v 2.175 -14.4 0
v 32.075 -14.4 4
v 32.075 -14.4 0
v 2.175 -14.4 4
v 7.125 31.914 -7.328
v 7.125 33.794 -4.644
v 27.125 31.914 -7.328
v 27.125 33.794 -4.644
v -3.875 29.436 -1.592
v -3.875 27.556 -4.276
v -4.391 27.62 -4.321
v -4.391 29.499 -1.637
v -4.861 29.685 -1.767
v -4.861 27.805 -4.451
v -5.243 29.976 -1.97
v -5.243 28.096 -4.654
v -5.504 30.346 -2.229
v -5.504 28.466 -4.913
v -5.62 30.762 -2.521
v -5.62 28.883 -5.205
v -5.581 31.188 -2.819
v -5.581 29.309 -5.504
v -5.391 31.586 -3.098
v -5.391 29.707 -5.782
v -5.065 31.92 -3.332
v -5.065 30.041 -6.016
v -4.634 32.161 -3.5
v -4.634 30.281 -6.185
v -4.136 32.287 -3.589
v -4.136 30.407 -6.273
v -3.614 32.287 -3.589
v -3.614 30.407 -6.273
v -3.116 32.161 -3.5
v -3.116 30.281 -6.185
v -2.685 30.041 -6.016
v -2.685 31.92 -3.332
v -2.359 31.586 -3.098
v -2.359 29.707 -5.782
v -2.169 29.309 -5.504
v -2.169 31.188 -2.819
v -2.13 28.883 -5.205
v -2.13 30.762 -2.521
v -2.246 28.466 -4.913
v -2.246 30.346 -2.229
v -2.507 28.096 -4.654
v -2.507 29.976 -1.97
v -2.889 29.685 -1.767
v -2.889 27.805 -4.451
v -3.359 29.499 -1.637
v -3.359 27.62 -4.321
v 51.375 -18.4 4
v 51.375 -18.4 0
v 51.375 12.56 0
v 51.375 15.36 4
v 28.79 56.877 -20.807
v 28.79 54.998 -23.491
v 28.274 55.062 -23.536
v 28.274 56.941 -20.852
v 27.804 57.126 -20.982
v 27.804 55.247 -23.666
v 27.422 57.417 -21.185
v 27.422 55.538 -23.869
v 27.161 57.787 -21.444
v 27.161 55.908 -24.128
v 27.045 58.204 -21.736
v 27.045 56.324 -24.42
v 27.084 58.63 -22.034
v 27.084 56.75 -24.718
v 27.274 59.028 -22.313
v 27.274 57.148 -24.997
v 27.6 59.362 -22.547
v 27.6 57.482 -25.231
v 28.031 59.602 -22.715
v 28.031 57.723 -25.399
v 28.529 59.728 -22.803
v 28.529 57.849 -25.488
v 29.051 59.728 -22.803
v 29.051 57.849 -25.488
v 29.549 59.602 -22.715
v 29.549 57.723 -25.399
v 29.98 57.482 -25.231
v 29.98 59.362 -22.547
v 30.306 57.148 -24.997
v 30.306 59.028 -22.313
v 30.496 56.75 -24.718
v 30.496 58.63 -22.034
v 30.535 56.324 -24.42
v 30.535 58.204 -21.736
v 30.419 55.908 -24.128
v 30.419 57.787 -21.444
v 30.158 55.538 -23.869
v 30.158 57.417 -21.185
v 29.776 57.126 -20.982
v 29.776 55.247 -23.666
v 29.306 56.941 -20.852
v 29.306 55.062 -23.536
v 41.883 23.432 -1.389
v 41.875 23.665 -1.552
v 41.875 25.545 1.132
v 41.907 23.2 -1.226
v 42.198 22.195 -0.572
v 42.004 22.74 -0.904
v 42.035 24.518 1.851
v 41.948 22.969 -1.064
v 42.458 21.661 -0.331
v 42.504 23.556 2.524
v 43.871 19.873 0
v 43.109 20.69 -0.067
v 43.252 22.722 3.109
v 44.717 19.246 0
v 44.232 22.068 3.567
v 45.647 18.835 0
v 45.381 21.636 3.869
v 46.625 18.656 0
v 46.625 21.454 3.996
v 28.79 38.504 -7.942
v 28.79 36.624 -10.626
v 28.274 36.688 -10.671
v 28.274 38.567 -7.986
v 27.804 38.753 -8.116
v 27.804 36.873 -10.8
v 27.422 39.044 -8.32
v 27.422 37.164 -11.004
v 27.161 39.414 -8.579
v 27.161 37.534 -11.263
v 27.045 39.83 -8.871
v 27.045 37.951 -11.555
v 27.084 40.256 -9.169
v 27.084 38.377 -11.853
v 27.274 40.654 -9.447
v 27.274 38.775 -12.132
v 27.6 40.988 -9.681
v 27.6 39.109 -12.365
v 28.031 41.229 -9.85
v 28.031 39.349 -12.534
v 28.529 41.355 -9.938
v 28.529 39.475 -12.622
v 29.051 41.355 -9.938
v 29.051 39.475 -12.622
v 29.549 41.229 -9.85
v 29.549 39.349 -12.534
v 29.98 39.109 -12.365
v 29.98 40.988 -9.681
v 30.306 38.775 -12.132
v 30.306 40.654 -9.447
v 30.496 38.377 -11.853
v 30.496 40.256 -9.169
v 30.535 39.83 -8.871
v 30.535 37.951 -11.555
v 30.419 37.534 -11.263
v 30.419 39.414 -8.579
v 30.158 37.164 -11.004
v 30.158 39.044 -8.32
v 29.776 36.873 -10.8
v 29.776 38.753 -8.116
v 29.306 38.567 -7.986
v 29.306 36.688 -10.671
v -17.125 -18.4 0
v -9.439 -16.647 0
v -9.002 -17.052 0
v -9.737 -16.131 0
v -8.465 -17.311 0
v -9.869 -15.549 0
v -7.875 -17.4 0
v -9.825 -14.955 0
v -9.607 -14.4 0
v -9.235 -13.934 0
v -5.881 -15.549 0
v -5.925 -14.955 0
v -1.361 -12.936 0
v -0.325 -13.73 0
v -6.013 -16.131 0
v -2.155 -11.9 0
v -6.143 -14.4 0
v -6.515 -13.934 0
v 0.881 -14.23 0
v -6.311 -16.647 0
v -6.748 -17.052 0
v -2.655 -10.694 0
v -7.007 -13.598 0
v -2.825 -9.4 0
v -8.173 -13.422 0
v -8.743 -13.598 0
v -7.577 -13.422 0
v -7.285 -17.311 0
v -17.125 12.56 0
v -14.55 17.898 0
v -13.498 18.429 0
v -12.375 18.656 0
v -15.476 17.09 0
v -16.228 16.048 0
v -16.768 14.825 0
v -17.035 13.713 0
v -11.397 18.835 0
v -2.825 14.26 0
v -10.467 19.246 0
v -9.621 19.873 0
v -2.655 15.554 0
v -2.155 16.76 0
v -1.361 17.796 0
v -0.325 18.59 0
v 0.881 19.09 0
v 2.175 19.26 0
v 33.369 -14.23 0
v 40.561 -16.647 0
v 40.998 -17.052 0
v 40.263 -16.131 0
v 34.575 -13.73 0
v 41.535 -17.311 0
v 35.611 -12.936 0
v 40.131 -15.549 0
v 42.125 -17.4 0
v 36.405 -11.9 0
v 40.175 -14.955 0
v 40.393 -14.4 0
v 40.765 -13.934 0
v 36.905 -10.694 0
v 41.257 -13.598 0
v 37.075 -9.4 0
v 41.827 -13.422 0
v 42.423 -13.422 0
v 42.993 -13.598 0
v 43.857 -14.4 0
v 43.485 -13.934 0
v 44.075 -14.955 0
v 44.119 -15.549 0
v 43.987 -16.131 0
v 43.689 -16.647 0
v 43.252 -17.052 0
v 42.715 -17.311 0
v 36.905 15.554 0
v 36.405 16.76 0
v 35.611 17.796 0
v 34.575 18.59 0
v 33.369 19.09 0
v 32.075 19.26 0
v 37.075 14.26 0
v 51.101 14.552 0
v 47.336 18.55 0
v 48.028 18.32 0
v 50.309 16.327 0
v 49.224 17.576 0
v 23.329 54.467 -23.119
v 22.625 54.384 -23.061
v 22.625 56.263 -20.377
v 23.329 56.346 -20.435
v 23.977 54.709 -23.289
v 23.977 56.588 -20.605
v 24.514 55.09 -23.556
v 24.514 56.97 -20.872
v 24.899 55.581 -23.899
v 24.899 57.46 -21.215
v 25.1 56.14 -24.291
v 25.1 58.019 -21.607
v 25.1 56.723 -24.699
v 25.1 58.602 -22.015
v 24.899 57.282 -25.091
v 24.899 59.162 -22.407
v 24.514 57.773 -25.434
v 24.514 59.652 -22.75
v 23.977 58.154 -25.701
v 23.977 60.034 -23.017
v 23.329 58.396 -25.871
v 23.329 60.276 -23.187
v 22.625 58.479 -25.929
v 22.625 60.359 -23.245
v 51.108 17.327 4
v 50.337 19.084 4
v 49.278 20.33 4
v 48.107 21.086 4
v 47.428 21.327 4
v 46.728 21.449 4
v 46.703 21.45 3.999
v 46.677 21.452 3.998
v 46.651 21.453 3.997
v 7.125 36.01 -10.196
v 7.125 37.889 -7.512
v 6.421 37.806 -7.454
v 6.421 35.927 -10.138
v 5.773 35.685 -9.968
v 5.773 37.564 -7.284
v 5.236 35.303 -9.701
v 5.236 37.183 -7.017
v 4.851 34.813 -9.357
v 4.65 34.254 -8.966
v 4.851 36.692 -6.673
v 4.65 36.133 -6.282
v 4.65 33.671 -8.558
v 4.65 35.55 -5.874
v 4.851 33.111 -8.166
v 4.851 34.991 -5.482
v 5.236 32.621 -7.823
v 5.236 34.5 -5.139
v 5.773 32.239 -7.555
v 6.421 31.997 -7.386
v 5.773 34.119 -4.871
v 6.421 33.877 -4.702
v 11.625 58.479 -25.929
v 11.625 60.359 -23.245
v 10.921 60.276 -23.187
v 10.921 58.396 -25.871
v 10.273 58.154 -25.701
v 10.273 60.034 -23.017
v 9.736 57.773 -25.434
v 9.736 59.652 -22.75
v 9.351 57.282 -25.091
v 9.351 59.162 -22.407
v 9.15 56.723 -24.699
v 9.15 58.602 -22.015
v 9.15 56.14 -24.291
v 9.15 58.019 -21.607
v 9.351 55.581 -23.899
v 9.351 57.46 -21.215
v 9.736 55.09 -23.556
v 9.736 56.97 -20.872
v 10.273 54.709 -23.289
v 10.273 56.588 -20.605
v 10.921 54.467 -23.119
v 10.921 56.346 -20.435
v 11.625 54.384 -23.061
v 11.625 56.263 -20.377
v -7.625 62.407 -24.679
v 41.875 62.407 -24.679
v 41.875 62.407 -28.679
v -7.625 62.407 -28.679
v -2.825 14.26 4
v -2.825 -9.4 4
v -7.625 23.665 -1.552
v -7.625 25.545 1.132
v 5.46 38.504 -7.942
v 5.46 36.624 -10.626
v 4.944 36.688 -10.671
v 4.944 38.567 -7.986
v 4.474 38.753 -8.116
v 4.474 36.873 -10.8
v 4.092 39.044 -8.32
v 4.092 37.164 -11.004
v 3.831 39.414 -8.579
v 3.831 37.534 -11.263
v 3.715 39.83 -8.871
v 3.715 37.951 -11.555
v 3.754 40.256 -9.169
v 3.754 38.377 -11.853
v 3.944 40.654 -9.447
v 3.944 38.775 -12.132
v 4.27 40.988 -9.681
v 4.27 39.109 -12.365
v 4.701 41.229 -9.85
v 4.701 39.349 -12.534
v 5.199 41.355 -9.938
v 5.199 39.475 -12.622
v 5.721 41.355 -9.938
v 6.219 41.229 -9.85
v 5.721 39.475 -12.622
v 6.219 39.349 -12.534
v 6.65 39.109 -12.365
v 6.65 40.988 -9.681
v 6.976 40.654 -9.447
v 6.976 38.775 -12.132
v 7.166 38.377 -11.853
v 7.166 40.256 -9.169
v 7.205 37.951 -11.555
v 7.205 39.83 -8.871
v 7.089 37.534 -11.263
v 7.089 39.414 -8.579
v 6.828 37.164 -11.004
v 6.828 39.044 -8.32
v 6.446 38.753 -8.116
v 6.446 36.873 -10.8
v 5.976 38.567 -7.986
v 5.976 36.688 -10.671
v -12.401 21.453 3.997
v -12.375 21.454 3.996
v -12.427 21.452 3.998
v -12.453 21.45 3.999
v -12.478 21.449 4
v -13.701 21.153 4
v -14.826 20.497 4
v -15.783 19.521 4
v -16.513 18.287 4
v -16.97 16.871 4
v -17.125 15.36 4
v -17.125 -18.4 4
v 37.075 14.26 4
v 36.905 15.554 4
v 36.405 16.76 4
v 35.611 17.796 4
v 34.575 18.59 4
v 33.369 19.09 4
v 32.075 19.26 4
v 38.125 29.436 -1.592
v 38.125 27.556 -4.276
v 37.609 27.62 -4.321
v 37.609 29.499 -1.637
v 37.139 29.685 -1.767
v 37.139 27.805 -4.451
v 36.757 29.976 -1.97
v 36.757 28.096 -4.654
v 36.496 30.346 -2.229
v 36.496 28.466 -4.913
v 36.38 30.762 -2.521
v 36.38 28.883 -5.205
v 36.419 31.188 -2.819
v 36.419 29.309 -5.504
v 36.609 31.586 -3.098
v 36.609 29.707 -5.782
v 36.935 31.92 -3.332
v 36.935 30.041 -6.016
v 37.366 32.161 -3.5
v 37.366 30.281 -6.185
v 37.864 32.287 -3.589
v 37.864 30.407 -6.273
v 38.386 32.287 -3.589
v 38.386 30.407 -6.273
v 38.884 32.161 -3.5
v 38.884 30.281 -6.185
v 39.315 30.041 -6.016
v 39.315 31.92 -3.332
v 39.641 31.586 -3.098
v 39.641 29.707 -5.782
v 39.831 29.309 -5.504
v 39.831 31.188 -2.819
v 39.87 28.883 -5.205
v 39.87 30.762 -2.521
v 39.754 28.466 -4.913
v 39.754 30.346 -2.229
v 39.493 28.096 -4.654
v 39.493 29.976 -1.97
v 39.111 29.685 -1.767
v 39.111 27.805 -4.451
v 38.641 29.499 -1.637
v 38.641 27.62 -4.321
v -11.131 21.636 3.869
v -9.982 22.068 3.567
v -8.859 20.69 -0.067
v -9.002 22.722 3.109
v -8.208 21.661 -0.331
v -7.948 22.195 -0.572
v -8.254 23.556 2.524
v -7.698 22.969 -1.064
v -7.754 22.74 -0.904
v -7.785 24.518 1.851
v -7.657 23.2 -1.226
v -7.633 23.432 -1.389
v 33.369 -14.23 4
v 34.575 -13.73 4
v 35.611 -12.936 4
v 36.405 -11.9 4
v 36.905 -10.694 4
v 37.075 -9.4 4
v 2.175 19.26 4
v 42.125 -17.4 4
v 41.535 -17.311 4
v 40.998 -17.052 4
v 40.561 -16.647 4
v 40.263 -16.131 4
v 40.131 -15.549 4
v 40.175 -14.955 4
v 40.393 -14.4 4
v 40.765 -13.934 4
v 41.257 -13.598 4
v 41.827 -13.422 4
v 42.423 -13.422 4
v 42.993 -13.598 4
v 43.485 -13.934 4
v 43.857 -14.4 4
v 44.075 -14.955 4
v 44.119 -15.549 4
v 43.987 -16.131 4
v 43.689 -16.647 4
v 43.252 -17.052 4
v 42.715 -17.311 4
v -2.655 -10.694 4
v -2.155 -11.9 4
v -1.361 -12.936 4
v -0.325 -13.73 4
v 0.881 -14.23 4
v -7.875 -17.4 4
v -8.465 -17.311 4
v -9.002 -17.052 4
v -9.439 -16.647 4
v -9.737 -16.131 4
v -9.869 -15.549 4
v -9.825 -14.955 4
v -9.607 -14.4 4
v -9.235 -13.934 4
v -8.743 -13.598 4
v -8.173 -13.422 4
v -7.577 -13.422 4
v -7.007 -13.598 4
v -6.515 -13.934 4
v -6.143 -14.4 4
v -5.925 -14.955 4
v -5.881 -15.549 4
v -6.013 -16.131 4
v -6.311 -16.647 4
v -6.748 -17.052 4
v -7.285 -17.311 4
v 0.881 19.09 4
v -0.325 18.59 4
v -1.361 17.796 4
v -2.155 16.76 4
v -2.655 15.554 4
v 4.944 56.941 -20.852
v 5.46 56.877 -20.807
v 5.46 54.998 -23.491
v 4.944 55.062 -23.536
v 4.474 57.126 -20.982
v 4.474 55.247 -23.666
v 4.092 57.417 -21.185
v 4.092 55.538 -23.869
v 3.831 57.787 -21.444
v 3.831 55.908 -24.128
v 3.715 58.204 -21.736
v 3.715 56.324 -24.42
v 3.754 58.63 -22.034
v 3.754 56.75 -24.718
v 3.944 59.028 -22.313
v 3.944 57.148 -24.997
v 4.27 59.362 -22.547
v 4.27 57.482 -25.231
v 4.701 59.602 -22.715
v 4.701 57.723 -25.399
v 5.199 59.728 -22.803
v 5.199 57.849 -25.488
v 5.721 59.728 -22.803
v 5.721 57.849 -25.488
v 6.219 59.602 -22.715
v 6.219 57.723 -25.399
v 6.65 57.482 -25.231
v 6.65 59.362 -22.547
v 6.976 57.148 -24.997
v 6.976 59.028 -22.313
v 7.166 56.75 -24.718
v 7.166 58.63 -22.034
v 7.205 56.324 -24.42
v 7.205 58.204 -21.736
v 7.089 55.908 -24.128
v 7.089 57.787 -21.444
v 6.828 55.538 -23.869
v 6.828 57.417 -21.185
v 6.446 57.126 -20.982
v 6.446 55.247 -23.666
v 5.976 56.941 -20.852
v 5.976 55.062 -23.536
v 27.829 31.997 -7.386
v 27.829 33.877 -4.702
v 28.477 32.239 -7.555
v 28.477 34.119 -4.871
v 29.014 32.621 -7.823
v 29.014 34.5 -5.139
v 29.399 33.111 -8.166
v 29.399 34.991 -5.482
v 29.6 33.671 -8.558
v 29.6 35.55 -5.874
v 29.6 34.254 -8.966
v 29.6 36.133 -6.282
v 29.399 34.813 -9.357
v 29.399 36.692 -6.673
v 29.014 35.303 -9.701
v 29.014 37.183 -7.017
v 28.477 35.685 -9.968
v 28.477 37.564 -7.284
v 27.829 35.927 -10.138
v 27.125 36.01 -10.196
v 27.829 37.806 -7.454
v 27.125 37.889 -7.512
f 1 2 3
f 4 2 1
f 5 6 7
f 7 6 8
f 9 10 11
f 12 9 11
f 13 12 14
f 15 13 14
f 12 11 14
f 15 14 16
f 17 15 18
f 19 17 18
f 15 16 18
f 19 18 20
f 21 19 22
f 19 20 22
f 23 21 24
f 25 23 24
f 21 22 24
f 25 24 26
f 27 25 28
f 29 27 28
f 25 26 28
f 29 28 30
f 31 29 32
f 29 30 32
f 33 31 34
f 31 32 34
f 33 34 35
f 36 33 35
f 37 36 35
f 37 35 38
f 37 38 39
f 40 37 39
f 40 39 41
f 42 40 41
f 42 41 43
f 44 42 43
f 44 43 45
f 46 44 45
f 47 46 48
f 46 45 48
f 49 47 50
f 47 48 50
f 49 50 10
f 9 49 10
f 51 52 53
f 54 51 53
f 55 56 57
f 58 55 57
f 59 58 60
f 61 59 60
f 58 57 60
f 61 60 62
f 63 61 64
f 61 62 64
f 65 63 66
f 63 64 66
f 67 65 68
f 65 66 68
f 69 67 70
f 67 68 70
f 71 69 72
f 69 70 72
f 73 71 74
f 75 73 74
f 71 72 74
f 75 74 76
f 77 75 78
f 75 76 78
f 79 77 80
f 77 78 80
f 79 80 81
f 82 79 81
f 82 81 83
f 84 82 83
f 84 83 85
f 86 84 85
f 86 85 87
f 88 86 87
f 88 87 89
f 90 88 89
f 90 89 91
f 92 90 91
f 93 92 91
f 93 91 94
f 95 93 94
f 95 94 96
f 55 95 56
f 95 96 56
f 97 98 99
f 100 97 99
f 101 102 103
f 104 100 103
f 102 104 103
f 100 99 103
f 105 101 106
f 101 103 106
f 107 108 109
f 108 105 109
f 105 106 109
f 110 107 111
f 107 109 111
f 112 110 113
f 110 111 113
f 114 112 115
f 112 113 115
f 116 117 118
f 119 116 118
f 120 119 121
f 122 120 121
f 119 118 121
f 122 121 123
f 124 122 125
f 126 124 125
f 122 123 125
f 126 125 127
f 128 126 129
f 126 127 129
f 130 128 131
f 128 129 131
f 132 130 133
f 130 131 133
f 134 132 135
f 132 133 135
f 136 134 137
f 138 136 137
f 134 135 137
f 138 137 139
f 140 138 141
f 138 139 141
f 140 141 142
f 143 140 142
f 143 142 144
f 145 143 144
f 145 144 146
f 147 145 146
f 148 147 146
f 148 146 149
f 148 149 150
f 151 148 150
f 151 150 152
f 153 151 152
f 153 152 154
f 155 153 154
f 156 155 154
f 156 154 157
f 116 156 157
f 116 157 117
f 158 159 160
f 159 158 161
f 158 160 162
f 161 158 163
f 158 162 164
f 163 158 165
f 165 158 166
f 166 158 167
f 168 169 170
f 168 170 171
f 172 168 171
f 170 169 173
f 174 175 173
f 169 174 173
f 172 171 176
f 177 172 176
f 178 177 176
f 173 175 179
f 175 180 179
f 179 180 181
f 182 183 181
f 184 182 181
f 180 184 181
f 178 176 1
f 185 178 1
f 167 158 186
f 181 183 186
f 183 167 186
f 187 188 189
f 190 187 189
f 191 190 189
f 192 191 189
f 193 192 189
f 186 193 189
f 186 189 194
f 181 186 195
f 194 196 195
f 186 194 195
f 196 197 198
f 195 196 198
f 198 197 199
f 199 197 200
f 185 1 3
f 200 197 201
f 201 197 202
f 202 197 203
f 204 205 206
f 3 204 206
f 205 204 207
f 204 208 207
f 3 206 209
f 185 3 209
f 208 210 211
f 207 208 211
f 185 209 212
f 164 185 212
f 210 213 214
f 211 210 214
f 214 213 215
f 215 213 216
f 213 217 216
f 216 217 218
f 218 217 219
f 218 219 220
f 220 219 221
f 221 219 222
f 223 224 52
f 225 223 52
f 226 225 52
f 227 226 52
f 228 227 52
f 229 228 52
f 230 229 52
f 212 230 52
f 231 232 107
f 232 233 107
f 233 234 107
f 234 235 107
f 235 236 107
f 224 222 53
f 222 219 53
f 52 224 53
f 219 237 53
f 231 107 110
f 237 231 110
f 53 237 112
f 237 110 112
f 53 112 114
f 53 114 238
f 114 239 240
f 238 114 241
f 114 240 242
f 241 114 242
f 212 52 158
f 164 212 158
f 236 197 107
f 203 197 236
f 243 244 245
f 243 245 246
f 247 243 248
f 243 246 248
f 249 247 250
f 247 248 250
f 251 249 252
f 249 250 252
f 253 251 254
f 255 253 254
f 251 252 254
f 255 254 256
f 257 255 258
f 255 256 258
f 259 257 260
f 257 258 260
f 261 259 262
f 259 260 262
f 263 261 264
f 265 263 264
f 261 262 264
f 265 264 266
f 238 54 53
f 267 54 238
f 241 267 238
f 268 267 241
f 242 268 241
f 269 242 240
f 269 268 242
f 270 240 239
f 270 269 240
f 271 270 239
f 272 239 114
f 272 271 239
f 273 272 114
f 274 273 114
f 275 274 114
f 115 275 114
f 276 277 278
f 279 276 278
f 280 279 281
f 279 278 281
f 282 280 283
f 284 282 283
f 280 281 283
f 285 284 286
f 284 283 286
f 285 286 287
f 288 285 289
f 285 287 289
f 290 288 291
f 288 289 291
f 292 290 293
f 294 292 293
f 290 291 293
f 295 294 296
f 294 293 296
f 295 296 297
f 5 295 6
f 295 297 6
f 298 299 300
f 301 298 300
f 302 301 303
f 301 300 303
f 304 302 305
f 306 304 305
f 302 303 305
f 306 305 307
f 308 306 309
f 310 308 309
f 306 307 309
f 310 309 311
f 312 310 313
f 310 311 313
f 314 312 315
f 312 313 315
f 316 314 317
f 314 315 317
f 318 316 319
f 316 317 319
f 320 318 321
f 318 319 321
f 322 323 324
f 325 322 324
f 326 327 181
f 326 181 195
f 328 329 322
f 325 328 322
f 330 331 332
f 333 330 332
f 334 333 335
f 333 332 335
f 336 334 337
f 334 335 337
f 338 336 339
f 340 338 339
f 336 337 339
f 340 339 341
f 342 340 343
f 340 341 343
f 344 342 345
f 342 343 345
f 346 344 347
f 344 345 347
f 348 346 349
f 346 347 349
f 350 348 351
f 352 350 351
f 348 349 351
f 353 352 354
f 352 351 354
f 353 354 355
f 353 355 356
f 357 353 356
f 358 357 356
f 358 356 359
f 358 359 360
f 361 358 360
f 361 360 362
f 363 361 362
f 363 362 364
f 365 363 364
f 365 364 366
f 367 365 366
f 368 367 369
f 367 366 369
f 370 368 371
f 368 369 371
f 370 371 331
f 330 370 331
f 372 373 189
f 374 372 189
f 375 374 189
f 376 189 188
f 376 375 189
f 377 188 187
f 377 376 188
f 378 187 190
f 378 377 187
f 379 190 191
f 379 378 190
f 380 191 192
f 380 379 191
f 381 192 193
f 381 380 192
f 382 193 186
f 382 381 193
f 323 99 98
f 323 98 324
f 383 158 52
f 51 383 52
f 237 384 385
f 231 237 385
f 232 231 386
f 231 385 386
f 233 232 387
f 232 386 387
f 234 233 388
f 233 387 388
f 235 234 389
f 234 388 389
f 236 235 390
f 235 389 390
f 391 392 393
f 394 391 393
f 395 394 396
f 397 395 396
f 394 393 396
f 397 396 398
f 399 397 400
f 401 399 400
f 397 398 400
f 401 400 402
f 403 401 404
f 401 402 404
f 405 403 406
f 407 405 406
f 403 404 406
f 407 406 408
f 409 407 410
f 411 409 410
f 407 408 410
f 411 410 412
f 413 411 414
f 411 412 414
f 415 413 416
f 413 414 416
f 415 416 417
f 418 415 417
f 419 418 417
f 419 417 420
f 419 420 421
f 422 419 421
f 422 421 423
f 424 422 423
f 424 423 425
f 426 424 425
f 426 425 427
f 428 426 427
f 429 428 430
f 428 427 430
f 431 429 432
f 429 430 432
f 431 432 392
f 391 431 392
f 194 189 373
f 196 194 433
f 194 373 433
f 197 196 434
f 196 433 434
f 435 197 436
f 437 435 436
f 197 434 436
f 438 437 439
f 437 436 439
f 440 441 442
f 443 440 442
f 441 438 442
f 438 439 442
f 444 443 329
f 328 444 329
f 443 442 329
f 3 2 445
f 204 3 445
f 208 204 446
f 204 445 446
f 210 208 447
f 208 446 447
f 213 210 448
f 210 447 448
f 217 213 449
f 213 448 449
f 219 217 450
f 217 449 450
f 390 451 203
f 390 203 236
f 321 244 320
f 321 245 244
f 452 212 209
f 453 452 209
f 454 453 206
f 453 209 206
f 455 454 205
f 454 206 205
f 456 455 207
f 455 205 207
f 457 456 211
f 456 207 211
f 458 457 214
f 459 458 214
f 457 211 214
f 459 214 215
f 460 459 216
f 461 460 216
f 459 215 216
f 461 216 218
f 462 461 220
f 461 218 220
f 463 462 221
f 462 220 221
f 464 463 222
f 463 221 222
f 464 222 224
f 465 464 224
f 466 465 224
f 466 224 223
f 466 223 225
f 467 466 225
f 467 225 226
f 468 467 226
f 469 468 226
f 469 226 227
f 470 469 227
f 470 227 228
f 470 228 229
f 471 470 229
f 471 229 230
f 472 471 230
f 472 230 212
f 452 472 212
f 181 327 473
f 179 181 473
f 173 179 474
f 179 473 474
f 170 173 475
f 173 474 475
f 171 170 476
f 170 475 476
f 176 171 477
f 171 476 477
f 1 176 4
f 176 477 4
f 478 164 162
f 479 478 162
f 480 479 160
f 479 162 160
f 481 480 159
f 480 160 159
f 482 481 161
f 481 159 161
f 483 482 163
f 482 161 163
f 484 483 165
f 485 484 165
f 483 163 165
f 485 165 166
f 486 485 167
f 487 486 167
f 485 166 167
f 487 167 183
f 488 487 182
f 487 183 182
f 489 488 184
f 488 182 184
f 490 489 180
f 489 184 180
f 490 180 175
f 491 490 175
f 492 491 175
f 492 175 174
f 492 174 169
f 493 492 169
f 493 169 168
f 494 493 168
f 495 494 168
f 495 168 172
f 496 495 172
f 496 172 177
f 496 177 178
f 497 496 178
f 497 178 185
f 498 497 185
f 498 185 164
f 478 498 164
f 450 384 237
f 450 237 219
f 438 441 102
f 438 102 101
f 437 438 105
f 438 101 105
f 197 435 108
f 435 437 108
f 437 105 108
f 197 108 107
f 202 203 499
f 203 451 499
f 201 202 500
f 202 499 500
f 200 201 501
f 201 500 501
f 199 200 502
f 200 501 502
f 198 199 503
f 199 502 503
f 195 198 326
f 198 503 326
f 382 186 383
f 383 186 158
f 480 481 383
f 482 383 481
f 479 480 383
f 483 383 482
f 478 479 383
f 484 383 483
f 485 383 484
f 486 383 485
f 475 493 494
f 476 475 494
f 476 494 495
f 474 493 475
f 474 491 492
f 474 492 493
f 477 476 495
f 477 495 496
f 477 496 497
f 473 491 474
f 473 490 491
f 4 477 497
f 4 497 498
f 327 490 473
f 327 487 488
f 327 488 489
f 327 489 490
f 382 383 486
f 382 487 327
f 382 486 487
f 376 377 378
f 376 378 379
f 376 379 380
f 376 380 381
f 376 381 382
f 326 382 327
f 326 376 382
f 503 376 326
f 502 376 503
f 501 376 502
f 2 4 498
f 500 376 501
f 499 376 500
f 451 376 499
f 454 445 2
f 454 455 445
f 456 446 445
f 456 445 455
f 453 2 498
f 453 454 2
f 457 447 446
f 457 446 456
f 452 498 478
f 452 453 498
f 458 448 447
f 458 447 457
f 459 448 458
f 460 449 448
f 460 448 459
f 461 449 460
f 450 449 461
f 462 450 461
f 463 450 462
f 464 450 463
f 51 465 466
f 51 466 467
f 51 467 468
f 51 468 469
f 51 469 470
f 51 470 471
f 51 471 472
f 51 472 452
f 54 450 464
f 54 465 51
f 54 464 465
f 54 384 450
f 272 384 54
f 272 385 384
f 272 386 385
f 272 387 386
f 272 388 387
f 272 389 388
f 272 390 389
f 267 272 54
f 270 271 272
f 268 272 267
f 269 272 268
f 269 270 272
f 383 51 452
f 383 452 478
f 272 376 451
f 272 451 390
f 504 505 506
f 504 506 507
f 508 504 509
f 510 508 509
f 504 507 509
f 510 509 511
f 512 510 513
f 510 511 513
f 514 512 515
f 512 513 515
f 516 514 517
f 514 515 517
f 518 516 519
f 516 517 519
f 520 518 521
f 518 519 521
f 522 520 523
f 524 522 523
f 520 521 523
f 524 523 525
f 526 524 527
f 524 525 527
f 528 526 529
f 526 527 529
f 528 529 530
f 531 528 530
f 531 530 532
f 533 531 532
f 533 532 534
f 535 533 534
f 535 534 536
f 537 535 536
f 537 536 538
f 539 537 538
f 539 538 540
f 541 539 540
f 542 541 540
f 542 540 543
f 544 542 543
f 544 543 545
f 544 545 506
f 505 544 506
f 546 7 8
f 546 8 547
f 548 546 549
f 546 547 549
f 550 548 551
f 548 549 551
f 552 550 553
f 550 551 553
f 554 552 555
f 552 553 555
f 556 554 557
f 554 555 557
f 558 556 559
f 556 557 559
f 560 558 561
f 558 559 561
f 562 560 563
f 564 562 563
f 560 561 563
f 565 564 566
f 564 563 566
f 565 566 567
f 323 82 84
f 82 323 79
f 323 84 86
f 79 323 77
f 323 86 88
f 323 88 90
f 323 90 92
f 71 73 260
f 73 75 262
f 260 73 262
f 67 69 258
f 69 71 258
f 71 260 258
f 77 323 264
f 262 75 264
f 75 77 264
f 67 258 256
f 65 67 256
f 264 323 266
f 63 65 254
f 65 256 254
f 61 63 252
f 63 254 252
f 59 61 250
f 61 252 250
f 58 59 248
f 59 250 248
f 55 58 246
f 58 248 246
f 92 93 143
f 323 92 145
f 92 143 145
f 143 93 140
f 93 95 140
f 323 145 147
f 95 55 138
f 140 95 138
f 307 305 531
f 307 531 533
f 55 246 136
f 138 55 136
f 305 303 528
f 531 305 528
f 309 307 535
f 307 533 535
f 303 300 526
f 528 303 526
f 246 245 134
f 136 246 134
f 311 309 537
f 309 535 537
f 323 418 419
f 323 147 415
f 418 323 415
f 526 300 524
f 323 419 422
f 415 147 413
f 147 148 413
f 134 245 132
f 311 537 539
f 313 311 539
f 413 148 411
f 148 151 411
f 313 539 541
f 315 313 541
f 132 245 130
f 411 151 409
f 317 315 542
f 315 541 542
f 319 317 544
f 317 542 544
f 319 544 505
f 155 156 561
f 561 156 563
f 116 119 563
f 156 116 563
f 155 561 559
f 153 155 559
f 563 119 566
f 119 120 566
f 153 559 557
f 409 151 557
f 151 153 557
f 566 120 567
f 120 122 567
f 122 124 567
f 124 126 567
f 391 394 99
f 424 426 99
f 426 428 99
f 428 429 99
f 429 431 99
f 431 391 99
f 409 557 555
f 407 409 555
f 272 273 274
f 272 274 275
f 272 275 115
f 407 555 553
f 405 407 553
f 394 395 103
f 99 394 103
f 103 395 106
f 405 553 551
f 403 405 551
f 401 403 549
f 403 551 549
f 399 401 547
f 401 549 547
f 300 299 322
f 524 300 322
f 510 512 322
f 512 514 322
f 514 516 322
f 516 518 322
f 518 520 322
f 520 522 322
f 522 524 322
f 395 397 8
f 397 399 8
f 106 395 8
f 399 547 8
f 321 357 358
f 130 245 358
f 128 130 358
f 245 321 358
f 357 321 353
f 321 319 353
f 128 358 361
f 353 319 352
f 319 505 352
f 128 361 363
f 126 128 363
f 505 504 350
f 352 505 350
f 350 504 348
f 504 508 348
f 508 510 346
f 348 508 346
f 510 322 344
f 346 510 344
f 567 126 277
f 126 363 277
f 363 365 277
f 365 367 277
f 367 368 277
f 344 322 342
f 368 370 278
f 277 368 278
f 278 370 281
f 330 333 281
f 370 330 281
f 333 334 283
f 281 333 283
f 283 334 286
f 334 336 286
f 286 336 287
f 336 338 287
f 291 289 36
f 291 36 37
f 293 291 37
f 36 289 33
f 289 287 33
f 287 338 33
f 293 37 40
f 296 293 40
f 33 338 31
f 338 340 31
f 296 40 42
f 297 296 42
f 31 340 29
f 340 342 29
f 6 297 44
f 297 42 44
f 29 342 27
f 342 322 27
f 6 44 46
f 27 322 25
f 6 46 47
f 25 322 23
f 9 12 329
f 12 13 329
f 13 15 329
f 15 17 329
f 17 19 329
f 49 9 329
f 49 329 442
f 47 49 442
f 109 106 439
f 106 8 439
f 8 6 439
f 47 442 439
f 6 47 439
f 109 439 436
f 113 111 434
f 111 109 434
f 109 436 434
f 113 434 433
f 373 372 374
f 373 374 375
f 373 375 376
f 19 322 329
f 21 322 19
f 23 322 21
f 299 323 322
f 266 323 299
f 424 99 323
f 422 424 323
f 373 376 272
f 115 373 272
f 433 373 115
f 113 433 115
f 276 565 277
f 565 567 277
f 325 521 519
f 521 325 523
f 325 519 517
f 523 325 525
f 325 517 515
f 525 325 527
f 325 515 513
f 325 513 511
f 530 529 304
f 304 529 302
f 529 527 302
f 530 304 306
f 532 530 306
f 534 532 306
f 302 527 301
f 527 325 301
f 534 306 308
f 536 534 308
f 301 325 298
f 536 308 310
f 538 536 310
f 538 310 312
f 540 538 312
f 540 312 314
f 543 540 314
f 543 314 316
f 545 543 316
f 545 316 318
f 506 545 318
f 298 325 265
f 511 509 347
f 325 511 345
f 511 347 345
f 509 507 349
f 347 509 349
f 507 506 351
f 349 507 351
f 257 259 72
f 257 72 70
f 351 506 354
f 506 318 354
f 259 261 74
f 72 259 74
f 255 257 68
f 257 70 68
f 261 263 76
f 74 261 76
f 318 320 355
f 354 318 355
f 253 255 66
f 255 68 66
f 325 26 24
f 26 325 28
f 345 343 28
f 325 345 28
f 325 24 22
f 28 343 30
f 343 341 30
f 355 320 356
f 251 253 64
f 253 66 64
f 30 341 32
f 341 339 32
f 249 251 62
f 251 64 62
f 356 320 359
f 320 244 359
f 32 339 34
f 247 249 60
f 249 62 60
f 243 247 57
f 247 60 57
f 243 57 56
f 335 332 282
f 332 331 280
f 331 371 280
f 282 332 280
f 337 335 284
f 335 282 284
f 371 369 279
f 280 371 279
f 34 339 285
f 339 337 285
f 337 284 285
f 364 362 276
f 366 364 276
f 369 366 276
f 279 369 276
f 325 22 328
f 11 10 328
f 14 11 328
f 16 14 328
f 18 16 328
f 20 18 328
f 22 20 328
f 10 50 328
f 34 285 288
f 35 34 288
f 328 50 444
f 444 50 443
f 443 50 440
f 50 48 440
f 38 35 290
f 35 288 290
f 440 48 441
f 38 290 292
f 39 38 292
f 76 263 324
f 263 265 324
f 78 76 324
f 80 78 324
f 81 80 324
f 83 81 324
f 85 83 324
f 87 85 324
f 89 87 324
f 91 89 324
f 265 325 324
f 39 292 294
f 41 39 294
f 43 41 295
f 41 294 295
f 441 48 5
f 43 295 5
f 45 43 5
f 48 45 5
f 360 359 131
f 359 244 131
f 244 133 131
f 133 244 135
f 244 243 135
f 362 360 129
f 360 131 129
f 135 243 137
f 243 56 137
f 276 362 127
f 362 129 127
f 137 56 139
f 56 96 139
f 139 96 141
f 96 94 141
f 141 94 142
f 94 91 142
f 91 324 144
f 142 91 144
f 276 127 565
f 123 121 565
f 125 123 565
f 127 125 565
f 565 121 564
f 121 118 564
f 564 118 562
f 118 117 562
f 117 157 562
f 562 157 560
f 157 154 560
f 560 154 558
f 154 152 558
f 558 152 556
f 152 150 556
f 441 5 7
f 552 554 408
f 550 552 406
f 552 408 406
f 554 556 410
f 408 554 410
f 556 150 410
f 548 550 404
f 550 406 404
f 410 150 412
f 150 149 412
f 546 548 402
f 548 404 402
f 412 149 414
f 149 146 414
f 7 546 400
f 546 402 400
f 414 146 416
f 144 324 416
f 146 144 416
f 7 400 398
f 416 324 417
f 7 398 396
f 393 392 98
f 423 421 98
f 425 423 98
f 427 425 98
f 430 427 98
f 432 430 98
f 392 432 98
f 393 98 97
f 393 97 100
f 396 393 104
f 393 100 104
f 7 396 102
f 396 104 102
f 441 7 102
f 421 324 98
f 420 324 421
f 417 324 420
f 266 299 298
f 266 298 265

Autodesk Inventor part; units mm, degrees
ref_plane "YZ Plane" through (0, 0, 0) normal (1, 0, 0) x (0, 1, 0)
ref_plane "XZ Plane" through (0, 0, 0) normal (0, 1, 0) x (-1, 0, 0)
ref_plane "XY Plane" through (0, 0, 0) normal (0, 0, 1) x (1, 0, 0)
sketch "Sketch1" plane through (0, 0, 0) normal (0, 0, 1) x (1, 0, 0)
  circle A0 centre (42.125, -15.4) radius 2 construction
  circle A1 centre (-7.875, -15.4) radius 2 construction
  line L0 (-4.825, -12.4) -> (-2.825, -14.4) construction
  line L1 (-9.825, -12.4) -> (-4.825, -12.4) construction
  arc A2 (-14.825, -7.4) -> (-9.825, -12.4) centre (-9.825, -7.4) ccw construction
  line L2 (-14.825, -7.4) -> (-14.825, 13.6) construction
  line L3 (-14.825, 13.6) -> (-15.625, 13.6) construction
  line L4 (-15.625, 13.6) -> (-15.625, 14.6) construction
  line L5 (-14.825, 15.4) -> (-15.625, 14.6) construction
  line L6 (-14.825, 15.4) -> (-14.825, 18.4) construction
  line L7 (-14.825, 18.4) -> (-17.125, 18.4) construction
  line L8 (-17.125, 18.4) -> (-17.125, -18.4) construction
  line L9 (-17.125, -18.4) -> (51.375, -18.4) construction
  line L10 (51.375, 18.4) -> (51.375, -18.4) construction
  line L11 (49.075, 18.4) -> (51.375, 18.4) construction
  line L12 (49.075, 15.4) -> (49.075, 18.4) construction
  line L13 (49.875, 14.6) -> (49.075, 15.4) construction
  line L14 (49.875, 13.6) -> (49.875, 14.6) construction
  line L15 (49.075, 13.6) -> (49.875, 13.6) construction
  line L16 (49.075, -7.4) -> (49.075, 13.6) construction
  arc A3 (44.075, -12.4) -> (49.075, -7.4) centre (44.075, -7.4) ccw construction
  line L17 (39.075, -12.4) -> (44.075, -12.4) construction
  line L18 (37.075, -14.4) -> (39.075, -12.4) construction
  line L19 (37.075, -14.4) -> (-2.825, -14.4) construction
  line L20 (-17.125, -18.4) -> (51.375, -18.4)
  line L21 (51.375, -18.4) -> (51.375, 21.449)
  line L22 (51.375, 21.449) -> (-17.125, 21.449)
  line L23 (-17.125, 21.449) -> (-17.125, -18.4)
  point P0 (0, 0)
extrude "Extrusion1" add sketch "Sketch1" along normal blind 4
sketch "Sketch2" plane through (51.375, -18.4, 0) normal (1, 0, 0) x (0, 0, -1)
  line L0 (0, 0) -> (0, 39.849) construction
  line L1 (0, 39.849) -> (-4, 39.849) construction
  line L2 (-4, 0) -> (-4, 39.849) construction
  line L3 (0, 0) -> (-4, 0) construction
  line L4 (-4, 39.849) -> (24.6788, 80.8066)
  line L5 (24.6788, 80.8066) -> (28.6788, 80.8066)
  line L6 (28.6788, 80.8066) -> (0, 39.849)
  line L7 (-4, 39.849) -> (0, 39.849)
  point P0 (0, 18.4)
  dimension "d2" = 55
  dimension "d5" = 50
extrude "Extrusion2" add sketch "Sketch2" against normal up to surface (68.5 mm away)
sketch "Sketch4" plane through (-17.125, 21.449, 4) normal (0, 0.5735764, 0.819152) x (1, 0, 0)
  line L0 (22.585, 45) -> (45.915, 45) construction
  line L1 (45.915, 45) -> (45.915, 22.57) construction
  line L2 (45.915, 22.57) -> (22.585, 22.57) construction
  line L3 (22.585, 22.57) -> (22.585, 45) construction
  line L4 (68.5, 50) -> (0, 50) construction
  point P0 (17.125, -15.2757)
  point P1 (34.25, 45)
  point P2 (34.25, 50)
  dimension "d11" = 23.33
  dimension "d12" = 22.43
  dimension "d13" = 5
hole "Hole1" at (5.46, 58.3109, -21.8109) at (28.79, 58.3109, -21.8109) at (28.79, 39.9373, -8.9456) at (5.46, 39.9373, -8.9456) direction (0, -0.5735764, -0.819152) diameter 3.5 end through all
sketch "Sketch5" plane through (-17.125, 21.449, 4) normal (0, 0.5735764, 0.819152) x (1, 0, 0)
  circle A0 centre (45.915, 22.57) radius 1.75 projected
  circle A1 centre (22.585, 45) radius 1.75 projected
  circle A2 centre (45.915, 45) radius 1.75 projected
  circle A3 centre (22.585, 22.57) radius 1.75 projected
  line L0 (0, 50) -> (0, 0) projected
  line L1 (68.5, 0) -> (0, 0) projected
  line L2 (68.5, 50) -> (68.5, 0) projected
  line L3 (68.5, 50) -> (0, 50) projected
  line L4 (28.75, 45) -> (39.75, 45) construction
  line L5 (28.75, 47.5) -> (39.75, 47.5)
  line L6 (39.75, 42.5) -> (28.75, 42.5)
  arc A4 (28.75, 47.5) -> (28.75, 42.5) centre (28.75, 45) ccw
  arc A5 (39.75, 42.5) -> (39.75, 47.5) centre (39.75, 45) ccw
  point P0 (17.125, -15.2757)
  point P1 (34.25, 45)
  dimension "d25" = 23.33
  dimension "d26" = 5
  dimension "d27" = 11
  dimension "d28" = 11.665
extrude "Extrusion3" cut sketch "Sketch5" against normal through all contours L5 A5 L6 A4
sketch "Sketch6" plane through (-17.125, 21.449, 4) normal (0, 0.5735764, 0.819152) x (1, 0, 0)
  line L0 (24.25, 17.57) -> (44.25, 17.57) construction
  line L1 (24.25, 15.07) -> (44.25, 15.07)
  line L2 (44.25, 20.07) -> (24.25, 20.07)
  arc A0 (24.25, 20.07) -> (24.25, 15.07) centre (24.25, 17.57) ccw
  arc A1 (44.25, 15.07) -> (44.25, 20.07) centre (44.25, 17.57) ccw
  line L3 (68.5, 0) -> (0, 0) projected
  circle A2 centre (22.585, 22.57) radius 1.75 projected
  point P0 (17.125, -15.2757)
  point P1 (34.25, 17.57)
  point P2 (34.25, 0)
  dimension "d31" = 5
  dimension "d32" = 20
  dimension "d33" = 5
extrude "Extrusion4" cut sketch "Sketch6" against normal through all contours A0 L2 A1 L1
sketch "Sketch7" plane through (-17.125, 21.449, 4) normal (0, 0.5735764, 0.819152) x (1, 0, 0)
  line L0 (24.25, 20.07) -> (44.25, 20.07) projected
  line L1 (68.5, 0) -> (0, 0) projected
  point P0 (17.125, -15.2757)
  point P1 (13.25, 11.5)
  point P2 (55.25, 11.5)
  point P3 (34.25, 20.07)
  dimension "d36" = 42
  dimension "d37" = 21
  dimension "d45" = 11.5
hole "Hole2" at (-3.875, 30.8693, -2.5961) at (38.125, 30.8693, -2.5961) direction (0, -0.5735764, -0.819152) diameter 3.5 end through all
sketch "Sketch8" plane through (-17.125, 21.449, 4) normal (0, 0.5735764, 0.819152) x (1, 0, 0)
  line L0 (0, 25.2888) -> (68.5, 25.2888) construction
  circle A0 centre (13.25, 11.5) radius 1.75 construction
  circle A1 centre (55.25, 11.5) radius 1.75 construction
  line L1 (24.25, 20.07) -> (44.25, 20.07) construction
  arc A2 (44.25, 15.07) -> (44.25, 20.07) centre (44.25, 17.57) ccw construction
  line L2 (44.25, 15.07) -> (24.25, 15.07) construction
  arc A3 (24.25, 20.07) -> (24.25, 15.07) centre (24.25, 17.57) ccw construction
  arc A4 (28.75, 47.5) -> (28.75, 42.5) centre (28.75, 45) ccw construction
  line L3 (28.75, 47.5) -> (39.75, 47.5) construction
  arc A5 (39.75, 42.5) -> (39.75, 47.5) centre (39.75, 45) ccw construction
  line L4 (39.75, 42.5) -> (28.75, 42.5) construction
  circle A6 centre (45.915, 22.57) radius 1.75 construction
  circle A7 centre (22.585, 45) radius 1.75 construction
  circle A8 centre (45.915, 45) radius 1.75 construction
  circle A9 centre (22.585, 22.57) radius 1.75 construction
  line L5 (0, 50) -> (0, 0) construction
  line L6 (68.5, 0) -> (0, 0) construction
  line L7 (68.5, 50) -> (68.5, 0) construction
  line L8 (68.5, 50) -> (0, 50) construction
  line L9 (0, 0) -> (9.5, 0)
  line L10 (9.5, 0) -> (9.5, 54)
  line L11 (9.5, 54) -> (0, 54)
  line L12 (0, 54) -> (0, 0)
  line L13 (68.5, 0) -> (59, 0)
  line L14 (59, 0) -> (59, 54)
  line L15 (59, 54) -> (68.5, 54)
  line L16 (68.5, 54) -> (68.5, 0)
  point P0 (17.125, -15.2757)
  dimension "d50" = 9.5
  dimension "d51" = 9.5
  dimension "d52" = 4
extrude "Extrusion5" cut sketch "Sketch8" against normal through all
fillet "Fillet1" radius 5 2 edges at (41.875, 20.0486, 2) (-7.625, 20.0486, 2)
sketch "Sketch9" plane through (0, 0, 4) normal (0, 0, 1) x (1, 0, 0)
  line L0 (-15.875, 15.26) -> (50.125, 15.26) construction
  line L1 (50.125, 15.26) -> (50.125, 13.6) construction
  line L2 (-15.875, 13.6) -> (50.125, 13.6) construction
  line L3 (-15.875, 15.26) -> (-15.875, 13.6) construction
  line L4 (-2.825, -14.4) -> (37.075, -14.4) construction
  line L5 (37.075, -14.4) -> (-2.825, -14.4)
  line L6 (-2.825, -14.4) -> (-2.825, 19.26)
  line L7 (-2.825, 19.26) -> (37.075, 19.26)
  line L8 (37.075, 19.26) -> (37.075, -14.4)
  point P0 (0, 0)
  dimension "d54" = 4
extrude "Extrusion6" cut sketch "Sketch9" against normal through all
fillet "Fillet2" radius 5 6 edges at (-2.825, 19.26, 2) (37.075, 19.26, 2) (37.075, -14.4, 2) (-2.825, -14.4, 2) (51.375, 20.0486, 2) (-17.125, 20.0486, 2)
sketch "Sketch10" plane through (0, 0, 4) normal (0, 0, 1) x (1, 0, 0)
  circle A0 centre (-7.875, -15.4) radius 2 construction
  circle A1 centre (42.125, -15.4) radius 2 construction
  point P0 (0, 0)
hole "Hole3" at (-7.875, -15.4, 4) at (42.125, -15.4, 4) direction (0, 0, -1) diameter 4 end through all
fillet "Fillet3" radius 5 1 edges at (17.125, 21.449, 0)
equation "\"d28\" = 0.5 * d25"
equation "\"d37\" = 0.5 * d36"
equation "\"d51\" = d50"
properties part number "UserInterface mount"
